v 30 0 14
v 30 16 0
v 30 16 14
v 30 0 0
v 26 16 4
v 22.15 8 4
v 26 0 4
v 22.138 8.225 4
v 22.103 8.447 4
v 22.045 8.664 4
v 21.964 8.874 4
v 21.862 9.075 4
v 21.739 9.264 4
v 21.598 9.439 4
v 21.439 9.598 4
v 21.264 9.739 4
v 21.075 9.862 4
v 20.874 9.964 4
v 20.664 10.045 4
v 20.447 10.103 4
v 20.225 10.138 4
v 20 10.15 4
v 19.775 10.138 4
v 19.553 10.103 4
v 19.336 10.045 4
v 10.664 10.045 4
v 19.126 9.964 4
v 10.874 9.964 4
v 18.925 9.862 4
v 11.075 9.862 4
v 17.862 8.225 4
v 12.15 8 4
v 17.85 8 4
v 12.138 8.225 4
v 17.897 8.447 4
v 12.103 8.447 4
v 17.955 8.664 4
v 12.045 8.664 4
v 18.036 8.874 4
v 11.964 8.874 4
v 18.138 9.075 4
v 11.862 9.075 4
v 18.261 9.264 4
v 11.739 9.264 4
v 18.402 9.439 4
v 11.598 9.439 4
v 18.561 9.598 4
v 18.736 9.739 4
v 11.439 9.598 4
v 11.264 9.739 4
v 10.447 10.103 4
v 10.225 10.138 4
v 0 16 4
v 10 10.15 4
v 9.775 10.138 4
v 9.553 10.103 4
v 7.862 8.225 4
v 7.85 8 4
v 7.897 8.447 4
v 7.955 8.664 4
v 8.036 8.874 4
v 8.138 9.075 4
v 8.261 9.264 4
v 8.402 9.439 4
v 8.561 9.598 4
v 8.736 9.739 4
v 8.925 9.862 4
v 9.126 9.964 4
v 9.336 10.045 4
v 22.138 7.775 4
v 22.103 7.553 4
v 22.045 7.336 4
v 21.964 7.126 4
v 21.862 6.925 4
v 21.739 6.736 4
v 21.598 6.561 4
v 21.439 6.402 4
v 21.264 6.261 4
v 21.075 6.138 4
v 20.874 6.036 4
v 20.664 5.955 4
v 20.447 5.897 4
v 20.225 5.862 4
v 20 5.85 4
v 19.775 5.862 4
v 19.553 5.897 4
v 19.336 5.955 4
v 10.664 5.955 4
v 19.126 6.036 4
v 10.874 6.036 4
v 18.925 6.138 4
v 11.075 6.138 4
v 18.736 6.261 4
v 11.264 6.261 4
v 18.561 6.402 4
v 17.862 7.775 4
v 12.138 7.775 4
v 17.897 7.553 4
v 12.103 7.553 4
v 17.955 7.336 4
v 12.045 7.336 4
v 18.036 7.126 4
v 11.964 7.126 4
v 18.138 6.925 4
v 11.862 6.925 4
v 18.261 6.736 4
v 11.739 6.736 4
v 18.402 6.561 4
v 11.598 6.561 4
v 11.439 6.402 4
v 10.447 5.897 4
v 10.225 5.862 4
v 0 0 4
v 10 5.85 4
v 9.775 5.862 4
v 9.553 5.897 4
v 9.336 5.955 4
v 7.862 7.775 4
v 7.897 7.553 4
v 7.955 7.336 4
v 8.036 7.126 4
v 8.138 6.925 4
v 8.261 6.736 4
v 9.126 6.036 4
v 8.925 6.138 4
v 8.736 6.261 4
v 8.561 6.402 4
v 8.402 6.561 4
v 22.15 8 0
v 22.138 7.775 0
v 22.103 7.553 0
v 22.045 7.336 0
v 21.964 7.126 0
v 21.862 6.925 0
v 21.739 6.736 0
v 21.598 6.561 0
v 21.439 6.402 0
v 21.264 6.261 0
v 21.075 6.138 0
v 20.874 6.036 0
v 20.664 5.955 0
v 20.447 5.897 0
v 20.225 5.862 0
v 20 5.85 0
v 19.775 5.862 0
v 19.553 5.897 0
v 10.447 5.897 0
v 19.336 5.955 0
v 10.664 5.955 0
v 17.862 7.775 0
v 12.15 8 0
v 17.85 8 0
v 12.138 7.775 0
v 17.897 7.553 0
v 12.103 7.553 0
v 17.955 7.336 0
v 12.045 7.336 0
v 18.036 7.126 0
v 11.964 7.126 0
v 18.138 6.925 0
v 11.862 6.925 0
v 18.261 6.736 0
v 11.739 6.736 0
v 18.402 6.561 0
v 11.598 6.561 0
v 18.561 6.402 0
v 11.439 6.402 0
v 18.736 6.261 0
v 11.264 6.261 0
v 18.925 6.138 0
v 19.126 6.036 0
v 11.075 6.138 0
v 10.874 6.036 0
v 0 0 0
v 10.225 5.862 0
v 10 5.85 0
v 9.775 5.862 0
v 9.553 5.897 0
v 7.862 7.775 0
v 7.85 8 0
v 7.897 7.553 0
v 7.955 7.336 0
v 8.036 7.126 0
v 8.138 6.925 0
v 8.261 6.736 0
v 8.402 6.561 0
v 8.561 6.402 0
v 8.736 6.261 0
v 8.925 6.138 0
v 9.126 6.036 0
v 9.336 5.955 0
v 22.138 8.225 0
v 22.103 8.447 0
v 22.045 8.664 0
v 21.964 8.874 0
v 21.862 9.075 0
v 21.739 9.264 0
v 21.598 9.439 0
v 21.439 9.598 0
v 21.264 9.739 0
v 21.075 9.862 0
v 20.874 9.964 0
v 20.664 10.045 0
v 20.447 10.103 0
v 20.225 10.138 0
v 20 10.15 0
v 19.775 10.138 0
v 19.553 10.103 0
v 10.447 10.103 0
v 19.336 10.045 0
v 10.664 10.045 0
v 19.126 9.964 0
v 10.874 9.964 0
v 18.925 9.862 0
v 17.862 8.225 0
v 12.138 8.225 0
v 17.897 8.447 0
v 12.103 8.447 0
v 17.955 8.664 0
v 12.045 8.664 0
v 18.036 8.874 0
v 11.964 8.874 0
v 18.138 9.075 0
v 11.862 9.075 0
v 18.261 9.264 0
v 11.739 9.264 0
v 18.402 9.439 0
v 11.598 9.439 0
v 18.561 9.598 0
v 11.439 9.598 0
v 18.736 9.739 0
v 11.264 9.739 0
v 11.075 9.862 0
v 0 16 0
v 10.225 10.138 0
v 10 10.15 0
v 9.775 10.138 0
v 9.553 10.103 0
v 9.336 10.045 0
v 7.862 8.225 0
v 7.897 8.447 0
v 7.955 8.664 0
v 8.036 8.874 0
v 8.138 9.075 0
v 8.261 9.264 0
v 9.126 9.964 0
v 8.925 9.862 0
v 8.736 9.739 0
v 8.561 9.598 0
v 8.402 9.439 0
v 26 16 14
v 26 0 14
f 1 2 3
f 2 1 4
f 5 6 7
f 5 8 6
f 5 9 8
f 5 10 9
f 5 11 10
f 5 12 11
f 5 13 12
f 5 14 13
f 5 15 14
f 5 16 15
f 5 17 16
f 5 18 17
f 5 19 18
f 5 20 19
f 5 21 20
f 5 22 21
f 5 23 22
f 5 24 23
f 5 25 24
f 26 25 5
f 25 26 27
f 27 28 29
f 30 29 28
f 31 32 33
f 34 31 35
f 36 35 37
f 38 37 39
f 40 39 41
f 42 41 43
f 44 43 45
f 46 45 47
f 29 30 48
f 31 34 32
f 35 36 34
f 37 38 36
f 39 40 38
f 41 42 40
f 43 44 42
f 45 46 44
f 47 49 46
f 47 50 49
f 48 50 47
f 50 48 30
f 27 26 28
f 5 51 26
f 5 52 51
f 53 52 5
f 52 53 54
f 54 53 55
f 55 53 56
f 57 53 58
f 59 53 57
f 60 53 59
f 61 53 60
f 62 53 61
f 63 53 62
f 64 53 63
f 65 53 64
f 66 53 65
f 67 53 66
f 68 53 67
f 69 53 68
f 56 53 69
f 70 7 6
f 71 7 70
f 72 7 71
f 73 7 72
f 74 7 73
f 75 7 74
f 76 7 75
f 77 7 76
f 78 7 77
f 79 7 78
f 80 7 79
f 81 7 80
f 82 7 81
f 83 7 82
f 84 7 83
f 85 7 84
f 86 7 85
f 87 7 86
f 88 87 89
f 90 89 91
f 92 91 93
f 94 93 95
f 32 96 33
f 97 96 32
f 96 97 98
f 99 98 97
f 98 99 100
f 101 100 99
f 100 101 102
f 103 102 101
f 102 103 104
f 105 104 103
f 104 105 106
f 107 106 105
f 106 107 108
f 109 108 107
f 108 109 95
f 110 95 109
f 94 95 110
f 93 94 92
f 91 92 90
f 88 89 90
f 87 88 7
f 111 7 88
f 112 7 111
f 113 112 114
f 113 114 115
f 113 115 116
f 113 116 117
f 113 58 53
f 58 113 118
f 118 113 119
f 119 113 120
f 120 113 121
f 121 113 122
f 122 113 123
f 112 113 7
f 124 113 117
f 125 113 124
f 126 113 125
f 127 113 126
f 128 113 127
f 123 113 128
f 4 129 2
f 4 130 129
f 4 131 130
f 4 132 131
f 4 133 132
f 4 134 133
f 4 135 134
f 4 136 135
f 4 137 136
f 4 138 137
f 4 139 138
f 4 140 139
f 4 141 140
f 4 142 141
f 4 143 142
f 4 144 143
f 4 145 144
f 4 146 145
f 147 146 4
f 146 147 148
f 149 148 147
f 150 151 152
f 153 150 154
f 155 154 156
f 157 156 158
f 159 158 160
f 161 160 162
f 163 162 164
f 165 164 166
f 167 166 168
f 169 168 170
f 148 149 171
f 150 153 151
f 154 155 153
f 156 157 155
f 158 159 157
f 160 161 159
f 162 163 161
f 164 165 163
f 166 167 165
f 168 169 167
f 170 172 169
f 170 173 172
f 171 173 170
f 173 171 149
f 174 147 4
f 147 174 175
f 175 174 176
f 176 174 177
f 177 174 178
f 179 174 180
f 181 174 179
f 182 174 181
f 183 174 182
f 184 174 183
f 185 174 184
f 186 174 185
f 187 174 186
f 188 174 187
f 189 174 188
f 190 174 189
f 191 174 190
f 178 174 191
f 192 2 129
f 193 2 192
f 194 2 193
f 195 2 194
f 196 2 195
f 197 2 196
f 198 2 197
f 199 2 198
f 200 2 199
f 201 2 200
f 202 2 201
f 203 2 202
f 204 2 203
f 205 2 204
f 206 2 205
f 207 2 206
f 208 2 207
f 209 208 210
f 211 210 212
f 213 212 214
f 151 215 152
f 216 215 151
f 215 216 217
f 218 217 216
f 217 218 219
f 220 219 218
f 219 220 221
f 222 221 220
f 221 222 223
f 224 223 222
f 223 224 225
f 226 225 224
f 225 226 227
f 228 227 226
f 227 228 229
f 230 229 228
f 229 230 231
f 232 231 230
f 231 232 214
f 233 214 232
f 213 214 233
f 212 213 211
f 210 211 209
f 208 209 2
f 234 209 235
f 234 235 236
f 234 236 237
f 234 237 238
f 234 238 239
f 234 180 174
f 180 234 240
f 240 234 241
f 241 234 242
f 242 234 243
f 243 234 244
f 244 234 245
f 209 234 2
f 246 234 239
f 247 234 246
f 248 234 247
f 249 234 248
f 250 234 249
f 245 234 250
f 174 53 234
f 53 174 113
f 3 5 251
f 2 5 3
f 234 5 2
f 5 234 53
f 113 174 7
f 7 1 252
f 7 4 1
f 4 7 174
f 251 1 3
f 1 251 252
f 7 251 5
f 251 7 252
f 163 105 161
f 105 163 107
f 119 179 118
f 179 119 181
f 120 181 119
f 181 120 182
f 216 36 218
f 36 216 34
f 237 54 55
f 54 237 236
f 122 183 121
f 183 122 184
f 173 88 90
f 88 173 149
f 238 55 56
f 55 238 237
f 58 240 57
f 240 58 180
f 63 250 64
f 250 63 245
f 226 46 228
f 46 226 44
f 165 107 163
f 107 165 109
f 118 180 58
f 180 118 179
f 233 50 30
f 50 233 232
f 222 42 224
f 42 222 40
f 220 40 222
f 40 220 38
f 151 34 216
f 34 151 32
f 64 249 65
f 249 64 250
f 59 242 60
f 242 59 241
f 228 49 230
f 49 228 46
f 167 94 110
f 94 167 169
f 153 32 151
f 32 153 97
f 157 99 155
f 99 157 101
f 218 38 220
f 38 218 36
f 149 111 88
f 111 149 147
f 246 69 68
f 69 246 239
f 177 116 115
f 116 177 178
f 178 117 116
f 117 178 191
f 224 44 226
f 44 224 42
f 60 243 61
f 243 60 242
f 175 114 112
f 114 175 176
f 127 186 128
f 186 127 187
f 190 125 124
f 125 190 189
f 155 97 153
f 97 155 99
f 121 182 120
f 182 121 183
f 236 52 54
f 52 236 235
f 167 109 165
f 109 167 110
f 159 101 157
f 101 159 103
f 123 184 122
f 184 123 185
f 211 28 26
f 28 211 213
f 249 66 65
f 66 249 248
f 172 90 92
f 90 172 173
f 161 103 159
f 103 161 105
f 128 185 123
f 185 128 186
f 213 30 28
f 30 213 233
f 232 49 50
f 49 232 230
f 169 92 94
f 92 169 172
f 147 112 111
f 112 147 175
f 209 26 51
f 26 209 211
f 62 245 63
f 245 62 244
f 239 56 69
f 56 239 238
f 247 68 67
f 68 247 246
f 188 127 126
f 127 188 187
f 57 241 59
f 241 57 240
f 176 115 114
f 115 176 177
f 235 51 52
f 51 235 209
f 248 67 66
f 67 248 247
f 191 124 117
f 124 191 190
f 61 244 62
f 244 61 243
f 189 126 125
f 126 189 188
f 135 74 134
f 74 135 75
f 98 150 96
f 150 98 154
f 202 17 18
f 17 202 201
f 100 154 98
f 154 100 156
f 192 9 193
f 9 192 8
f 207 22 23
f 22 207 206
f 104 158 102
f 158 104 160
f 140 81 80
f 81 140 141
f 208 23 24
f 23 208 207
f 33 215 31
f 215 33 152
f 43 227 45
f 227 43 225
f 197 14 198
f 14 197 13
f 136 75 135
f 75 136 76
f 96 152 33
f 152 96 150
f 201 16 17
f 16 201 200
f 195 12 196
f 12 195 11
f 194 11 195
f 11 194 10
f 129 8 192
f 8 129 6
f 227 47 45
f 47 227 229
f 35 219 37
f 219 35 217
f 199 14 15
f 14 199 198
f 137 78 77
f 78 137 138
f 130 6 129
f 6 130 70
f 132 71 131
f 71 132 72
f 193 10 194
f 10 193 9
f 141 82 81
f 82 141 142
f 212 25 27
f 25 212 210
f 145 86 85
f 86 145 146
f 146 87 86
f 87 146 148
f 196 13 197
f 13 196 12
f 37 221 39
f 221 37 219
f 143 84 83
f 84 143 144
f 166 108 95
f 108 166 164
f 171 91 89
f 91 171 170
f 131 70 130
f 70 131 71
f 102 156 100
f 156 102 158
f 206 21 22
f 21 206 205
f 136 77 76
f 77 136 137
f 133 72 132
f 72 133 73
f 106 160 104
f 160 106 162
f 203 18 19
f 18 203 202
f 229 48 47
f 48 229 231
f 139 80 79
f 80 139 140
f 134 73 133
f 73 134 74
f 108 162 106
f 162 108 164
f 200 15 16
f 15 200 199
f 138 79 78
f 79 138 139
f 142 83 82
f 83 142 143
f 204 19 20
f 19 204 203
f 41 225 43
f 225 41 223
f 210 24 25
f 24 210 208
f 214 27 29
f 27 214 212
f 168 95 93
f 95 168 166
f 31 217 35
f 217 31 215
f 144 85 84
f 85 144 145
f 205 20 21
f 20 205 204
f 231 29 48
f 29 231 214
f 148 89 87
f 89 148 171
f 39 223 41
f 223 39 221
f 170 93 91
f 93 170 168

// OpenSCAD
// Latch hook bracket.
$fn = 60;
eps = 0.02;
length = 30;
height = 10;
width = 16;
thickness = 4;
difference() { union() { cube([length,width,thickness]); translate([length-thickness,0,thickness]) cube([thickness,width,height]); } for(x=[10,length-10]) translate([x,width/2,-eps]) cylinder(d=4.3,h=thickness+2*eps); }
